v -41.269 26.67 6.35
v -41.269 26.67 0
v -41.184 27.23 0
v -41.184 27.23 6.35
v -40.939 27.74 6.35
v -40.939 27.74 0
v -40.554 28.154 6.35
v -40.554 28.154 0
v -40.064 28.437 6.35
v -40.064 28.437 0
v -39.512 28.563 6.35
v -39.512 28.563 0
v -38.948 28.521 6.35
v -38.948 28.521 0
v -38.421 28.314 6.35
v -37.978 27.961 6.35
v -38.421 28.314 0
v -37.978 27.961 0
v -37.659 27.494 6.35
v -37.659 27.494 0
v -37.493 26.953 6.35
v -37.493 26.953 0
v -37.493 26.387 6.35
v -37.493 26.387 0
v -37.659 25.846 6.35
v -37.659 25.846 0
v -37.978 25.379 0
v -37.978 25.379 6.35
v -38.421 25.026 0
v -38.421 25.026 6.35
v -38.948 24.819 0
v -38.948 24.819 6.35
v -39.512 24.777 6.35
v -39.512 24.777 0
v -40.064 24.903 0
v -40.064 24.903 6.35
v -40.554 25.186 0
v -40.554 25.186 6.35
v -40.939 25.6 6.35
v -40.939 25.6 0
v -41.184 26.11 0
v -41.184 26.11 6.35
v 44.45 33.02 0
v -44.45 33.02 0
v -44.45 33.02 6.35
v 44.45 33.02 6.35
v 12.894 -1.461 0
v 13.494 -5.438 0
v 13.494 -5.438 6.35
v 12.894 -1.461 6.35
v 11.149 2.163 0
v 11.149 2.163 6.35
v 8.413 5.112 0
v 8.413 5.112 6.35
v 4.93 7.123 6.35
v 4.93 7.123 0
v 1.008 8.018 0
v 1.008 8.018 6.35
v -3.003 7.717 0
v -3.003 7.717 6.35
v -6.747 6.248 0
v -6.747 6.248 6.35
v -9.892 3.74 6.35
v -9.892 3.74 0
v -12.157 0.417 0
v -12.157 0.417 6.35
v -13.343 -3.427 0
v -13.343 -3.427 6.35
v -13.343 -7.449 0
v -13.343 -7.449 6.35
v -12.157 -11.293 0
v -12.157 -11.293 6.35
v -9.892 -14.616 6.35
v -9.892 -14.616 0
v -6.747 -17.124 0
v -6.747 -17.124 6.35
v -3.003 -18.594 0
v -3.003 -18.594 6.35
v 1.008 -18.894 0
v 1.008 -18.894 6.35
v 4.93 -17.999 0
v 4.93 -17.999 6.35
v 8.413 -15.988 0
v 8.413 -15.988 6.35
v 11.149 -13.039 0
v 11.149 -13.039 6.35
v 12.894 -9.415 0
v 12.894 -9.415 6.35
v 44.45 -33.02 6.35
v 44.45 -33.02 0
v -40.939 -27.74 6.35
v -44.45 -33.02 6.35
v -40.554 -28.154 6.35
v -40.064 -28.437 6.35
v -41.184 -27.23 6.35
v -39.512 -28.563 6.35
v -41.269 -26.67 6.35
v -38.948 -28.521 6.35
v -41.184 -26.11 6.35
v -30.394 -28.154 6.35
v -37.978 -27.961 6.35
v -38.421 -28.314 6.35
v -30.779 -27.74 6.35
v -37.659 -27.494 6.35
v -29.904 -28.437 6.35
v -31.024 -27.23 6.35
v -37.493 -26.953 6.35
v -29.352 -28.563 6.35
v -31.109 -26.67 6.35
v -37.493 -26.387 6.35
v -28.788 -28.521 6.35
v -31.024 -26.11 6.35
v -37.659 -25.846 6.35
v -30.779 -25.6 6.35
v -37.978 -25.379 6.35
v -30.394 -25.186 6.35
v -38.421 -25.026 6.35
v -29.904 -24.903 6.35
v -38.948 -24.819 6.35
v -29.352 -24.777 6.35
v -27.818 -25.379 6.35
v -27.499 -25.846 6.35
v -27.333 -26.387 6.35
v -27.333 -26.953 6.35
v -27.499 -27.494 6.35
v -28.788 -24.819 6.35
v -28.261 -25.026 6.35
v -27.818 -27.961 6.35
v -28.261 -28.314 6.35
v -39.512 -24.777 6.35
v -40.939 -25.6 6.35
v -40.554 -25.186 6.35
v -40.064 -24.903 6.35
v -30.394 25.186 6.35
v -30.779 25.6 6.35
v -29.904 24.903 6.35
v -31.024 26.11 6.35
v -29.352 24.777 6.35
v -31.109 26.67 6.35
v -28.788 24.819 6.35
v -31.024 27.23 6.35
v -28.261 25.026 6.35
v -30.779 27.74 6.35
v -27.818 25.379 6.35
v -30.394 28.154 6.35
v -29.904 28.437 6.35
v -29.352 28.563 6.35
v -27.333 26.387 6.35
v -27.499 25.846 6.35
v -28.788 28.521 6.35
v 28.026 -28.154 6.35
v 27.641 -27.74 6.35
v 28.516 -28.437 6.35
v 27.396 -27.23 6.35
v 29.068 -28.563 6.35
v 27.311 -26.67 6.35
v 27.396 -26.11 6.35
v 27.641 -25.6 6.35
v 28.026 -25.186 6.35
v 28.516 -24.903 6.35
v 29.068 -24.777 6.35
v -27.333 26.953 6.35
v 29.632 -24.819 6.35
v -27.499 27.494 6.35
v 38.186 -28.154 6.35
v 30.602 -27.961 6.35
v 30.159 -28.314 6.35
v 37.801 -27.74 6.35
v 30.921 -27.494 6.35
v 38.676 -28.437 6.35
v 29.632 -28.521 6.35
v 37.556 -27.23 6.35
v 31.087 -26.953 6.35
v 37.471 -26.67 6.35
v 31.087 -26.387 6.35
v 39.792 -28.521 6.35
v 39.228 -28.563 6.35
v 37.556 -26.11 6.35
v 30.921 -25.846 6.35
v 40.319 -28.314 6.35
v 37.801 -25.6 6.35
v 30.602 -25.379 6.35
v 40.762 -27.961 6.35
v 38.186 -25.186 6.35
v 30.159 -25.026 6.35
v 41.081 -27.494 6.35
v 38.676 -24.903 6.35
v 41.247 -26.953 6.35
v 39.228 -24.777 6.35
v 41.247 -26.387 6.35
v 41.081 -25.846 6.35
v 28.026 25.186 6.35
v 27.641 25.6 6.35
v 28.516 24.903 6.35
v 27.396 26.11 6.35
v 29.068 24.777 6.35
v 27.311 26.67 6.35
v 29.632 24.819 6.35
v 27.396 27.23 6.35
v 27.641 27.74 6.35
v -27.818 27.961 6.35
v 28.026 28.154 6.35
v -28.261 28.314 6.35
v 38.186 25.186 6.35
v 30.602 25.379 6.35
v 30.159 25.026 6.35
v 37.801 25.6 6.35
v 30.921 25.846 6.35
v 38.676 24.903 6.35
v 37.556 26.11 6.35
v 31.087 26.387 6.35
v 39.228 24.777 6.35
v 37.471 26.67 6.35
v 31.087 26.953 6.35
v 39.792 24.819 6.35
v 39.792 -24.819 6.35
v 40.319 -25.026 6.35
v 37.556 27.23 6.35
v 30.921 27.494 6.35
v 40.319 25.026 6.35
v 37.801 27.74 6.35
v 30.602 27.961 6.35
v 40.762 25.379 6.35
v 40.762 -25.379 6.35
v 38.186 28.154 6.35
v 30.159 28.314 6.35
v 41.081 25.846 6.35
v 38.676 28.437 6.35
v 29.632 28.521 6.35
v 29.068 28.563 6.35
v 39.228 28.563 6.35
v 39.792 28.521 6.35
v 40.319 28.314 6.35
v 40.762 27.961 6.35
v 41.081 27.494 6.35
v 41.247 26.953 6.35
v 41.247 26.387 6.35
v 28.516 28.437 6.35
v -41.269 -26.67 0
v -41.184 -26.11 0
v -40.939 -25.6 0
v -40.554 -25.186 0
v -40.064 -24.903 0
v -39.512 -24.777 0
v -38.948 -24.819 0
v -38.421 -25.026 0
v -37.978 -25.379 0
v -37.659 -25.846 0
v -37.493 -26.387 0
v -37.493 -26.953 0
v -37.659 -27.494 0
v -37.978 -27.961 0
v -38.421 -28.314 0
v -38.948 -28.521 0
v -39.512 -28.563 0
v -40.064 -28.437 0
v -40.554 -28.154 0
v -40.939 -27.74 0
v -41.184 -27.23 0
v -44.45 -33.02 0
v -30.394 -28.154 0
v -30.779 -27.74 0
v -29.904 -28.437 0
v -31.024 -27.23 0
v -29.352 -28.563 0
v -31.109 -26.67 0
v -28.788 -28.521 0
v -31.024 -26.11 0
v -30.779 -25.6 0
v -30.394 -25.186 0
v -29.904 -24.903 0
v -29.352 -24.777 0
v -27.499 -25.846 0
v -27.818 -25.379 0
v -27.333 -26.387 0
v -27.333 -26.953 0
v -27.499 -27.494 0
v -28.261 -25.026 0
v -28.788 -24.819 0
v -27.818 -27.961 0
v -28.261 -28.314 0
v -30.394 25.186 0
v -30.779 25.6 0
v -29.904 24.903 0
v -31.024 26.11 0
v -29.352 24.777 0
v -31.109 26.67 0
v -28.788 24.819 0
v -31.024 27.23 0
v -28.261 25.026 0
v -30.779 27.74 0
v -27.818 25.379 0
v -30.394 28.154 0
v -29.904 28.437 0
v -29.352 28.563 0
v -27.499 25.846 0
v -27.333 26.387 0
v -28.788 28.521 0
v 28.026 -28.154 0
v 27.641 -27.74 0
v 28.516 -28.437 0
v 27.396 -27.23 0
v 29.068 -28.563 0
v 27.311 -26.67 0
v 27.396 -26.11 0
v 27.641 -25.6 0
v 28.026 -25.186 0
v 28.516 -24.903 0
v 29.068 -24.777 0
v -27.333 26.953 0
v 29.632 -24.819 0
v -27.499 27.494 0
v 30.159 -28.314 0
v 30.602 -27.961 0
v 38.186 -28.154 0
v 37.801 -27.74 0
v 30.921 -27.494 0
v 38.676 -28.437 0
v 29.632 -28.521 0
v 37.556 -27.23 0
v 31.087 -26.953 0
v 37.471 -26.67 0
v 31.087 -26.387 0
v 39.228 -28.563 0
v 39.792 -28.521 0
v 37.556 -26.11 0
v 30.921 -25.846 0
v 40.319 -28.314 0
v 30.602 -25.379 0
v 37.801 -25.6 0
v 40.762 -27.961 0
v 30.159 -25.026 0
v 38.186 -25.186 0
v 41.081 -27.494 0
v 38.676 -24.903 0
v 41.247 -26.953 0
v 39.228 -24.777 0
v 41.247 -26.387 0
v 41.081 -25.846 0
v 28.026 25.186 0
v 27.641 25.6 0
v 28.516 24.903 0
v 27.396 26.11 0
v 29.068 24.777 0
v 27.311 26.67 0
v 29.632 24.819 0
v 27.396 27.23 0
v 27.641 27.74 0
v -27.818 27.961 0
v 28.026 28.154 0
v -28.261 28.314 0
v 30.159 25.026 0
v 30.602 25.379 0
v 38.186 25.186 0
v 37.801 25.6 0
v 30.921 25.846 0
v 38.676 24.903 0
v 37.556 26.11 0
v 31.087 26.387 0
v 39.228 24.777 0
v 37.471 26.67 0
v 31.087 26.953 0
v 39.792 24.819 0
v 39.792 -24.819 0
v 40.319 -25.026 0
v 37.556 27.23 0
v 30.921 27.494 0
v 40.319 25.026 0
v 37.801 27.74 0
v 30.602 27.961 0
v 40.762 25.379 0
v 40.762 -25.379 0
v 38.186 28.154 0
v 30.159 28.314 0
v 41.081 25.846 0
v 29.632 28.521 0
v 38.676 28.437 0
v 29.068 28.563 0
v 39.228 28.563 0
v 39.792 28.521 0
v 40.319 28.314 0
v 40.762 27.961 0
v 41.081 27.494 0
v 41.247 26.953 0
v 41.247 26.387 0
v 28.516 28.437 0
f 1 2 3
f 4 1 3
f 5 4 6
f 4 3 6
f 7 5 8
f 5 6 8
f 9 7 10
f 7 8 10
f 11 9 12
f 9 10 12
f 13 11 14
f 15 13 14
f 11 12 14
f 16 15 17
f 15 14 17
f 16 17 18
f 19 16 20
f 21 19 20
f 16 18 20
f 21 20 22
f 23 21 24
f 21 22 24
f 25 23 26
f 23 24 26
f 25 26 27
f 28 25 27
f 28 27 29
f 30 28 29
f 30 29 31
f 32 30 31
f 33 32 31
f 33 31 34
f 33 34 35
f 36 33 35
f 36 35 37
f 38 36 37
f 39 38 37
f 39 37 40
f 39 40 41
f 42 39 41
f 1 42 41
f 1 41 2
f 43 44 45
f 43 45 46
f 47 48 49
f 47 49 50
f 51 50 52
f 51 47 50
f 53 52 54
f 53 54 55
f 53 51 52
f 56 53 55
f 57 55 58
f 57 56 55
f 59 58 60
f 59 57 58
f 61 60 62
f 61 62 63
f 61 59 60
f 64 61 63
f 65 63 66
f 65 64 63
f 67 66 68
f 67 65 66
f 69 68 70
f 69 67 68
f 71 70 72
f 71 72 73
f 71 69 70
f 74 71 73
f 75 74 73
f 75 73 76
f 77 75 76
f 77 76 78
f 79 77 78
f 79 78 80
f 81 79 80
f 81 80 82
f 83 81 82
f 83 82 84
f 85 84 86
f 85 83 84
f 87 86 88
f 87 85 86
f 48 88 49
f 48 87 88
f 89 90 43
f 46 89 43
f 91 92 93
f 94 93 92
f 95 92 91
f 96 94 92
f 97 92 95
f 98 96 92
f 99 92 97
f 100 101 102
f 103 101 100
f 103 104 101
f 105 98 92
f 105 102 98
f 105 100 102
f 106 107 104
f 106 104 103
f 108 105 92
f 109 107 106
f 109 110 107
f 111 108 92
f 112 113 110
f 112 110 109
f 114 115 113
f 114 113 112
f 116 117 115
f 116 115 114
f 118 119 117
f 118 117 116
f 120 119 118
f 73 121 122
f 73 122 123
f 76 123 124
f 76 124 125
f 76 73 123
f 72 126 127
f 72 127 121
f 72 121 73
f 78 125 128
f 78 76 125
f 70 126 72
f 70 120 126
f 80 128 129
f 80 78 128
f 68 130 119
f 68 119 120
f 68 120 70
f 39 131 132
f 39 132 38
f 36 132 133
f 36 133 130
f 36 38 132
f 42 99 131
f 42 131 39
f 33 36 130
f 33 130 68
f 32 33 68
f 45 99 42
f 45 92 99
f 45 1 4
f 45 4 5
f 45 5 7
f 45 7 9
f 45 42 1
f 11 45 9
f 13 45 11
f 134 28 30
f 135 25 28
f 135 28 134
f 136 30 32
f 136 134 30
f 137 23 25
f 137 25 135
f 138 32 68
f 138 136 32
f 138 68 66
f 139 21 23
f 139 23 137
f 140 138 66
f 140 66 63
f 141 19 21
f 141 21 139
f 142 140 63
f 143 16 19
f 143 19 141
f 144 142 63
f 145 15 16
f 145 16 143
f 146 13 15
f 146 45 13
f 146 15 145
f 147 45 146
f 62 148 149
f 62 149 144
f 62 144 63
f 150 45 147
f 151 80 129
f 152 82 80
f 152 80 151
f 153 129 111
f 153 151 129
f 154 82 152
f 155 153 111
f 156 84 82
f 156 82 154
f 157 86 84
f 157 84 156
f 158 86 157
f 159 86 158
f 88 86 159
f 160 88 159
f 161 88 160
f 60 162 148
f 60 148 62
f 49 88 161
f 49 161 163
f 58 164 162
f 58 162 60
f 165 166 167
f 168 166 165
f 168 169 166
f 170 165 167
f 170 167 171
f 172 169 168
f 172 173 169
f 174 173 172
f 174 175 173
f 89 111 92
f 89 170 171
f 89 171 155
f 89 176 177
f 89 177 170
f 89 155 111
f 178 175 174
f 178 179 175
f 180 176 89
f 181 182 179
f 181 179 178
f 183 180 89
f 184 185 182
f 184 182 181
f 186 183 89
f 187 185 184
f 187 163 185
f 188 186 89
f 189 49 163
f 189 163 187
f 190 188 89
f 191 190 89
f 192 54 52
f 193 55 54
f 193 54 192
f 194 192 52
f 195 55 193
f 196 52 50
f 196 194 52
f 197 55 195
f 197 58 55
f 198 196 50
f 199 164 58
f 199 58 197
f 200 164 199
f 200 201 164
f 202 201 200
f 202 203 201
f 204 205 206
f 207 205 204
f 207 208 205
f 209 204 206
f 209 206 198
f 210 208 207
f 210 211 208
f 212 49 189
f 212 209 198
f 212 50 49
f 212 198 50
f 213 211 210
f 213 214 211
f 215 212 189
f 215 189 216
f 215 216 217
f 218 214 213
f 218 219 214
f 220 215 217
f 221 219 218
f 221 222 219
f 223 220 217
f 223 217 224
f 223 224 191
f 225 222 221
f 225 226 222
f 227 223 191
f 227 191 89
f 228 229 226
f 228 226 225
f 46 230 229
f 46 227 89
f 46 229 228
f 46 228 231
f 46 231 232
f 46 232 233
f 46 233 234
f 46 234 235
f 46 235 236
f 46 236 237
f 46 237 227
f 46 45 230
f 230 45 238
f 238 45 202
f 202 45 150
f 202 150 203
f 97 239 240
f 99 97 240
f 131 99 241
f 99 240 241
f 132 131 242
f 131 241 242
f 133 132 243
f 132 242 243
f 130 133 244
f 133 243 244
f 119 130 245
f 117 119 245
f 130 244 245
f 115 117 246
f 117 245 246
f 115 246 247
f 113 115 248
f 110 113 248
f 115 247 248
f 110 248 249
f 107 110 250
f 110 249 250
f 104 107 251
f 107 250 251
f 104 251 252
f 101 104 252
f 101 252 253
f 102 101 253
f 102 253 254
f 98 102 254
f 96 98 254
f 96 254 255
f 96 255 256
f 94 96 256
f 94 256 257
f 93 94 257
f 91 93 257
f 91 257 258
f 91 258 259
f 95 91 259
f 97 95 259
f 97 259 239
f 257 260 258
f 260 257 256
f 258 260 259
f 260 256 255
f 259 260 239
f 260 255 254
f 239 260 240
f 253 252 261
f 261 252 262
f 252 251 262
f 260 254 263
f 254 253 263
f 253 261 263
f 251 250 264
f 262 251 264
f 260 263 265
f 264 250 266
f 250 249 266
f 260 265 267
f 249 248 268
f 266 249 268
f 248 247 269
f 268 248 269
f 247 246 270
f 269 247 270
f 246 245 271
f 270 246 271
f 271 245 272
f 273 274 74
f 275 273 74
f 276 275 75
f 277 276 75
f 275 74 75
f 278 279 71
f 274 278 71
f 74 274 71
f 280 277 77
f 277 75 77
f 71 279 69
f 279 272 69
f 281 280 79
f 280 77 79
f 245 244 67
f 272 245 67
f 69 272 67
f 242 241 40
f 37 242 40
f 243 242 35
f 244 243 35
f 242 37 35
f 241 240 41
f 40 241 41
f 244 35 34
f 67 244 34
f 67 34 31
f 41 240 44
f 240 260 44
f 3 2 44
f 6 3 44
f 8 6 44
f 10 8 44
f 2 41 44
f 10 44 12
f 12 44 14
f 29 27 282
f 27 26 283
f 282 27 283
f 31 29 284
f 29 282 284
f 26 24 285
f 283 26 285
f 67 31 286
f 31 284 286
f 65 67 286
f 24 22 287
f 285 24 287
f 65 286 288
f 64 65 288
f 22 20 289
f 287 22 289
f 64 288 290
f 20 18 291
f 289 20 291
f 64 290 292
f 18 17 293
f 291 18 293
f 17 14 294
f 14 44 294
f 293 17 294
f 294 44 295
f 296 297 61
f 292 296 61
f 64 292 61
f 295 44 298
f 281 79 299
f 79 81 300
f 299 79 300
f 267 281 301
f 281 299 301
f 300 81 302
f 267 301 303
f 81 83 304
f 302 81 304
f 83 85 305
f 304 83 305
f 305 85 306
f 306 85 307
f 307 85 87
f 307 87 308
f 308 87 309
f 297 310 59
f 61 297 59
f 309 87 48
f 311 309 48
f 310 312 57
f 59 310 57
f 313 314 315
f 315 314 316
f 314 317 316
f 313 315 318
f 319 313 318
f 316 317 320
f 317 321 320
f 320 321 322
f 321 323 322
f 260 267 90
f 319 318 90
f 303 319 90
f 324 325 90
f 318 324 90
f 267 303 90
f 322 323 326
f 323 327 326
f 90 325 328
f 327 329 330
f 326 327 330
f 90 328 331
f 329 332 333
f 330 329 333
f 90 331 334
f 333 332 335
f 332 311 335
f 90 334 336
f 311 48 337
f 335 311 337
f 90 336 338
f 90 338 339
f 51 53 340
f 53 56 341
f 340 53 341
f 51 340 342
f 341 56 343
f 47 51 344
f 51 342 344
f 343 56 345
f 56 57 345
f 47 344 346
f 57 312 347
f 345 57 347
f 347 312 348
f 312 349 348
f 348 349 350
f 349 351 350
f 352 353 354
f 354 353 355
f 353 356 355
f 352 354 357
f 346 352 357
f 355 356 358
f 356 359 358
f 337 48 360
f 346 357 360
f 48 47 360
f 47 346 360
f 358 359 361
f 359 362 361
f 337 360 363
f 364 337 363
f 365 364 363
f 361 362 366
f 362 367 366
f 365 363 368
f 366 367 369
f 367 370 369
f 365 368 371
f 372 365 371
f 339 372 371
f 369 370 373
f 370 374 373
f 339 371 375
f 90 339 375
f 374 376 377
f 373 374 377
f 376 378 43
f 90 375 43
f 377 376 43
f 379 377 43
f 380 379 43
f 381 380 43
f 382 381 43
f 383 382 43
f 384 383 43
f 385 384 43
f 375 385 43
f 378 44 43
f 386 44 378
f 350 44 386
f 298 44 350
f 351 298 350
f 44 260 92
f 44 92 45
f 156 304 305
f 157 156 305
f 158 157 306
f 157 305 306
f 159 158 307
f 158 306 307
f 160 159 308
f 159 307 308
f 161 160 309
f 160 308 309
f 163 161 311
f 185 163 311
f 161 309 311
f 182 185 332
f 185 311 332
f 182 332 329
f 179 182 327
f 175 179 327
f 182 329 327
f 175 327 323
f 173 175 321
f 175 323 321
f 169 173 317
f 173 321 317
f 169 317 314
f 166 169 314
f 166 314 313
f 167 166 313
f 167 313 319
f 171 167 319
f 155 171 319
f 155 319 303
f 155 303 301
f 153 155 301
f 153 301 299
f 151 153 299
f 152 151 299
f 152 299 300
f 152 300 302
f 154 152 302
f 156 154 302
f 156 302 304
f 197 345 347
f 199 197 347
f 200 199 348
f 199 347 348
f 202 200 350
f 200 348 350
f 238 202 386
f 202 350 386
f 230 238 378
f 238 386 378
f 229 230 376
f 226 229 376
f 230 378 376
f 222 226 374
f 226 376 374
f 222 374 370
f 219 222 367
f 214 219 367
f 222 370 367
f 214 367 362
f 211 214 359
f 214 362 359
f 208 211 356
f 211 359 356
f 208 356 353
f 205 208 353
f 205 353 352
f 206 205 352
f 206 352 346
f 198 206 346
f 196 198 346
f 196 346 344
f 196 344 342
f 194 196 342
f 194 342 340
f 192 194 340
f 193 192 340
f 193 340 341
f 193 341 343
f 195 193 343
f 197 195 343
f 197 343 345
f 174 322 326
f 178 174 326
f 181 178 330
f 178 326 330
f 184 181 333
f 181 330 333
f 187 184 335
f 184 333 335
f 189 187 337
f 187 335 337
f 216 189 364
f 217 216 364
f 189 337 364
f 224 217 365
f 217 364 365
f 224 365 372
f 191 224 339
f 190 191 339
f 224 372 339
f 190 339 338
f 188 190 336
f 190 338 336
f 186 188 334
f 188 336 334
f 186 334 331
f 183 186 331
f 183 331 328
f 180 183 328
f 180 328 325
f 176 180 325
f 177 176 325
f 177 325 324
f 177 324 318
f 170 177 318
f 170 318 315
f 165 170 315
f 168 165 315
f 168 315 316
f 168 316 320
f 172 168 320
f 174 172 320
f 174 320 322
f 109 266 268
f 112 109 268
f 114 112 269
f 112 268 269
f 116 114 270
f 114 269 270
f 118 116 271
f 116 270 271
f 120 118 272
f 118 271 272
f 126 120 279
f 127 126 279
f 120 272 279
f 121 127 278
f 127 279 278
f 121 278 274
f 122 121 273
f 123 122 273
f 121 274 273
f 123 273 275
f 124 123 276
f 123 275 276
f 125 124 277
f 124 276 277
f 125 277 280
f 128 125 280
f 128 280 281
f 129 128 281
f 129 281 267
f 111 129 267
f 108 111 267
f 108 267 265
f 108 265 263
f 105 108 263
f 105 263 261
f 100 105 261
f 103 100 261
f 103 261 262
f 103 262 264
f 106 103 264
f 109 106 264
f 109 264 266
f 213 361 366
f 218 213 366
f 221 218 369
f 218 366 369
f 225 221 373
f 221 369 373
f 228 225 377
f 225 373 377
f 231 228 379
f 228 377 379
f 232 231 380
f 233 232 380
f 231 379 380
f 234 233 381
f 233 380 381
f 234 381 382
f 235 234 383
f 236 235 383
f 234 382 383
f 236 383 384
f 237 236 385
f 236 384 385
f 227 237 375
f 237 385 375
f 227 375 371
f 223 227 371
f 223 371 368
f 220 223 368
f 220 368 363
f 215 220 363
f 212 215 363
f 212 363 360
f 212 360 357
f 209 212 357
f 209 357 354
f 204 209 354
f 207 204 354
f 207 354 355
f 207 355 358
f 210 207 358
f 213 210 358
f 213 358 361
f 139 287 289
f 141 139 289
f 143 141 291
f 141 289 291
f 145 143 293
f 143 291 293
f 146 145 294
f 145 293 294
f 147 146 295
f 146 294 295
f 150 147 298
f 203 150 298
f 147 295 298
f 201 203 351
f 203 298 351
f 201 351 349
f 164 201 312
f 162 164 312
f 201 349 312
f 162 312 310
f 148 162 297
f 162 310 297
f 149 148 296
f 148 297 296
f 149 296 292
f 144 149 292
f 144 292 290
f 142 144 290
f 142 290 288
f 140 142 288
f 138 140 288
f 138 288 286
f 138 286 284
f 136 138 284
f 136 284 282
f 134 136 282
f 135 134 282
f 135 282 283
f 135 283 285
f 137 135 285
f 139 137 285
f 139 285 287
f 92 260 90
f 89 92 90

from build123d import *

# Parameters (mm, degrees)
SKETCH1_W             = 88.9
SKETCH1_H             = 66.04
SKETCH1_R             = 13.49375
BOSS_EXTRUDE1_DEPTH   = 6.35
F_6_CLEARANCE_HOLE1_D = 3.7973
F_6_CLEARANCE_HOLE2_D = 3.7973


with BuildPart() as part:
    # Sketch1 → Boss-Extrude1 (new body)
    with BuildSketch(Plane.XY):
        Rectangle(SKETCH1_W, SKETCH1_H)
        with Locations((0, -5.43814)):
            Circle(SKETCH1_R, mode=Mode.SUBTRACT)
    extrude(amount=BOSS_EXTRUDE1_DEPTH)

    # #6 Clearance Hole1 (through all)
    with Locations(Plane.XY.offset(6.35)):
        with Locations((-39.37, -26.67), (-29.21, -26.67), (29.21, -26.67), (39.37, -26.67)):
            Hole(F_6_CLEARANCE_HOLE1_D / 2)

    # #6 Clearance Hole2 (through all)
    with Locations(Plane(origin=(-39.37, 26.67, 6.35), x_dir=(1, 0, 0), z_dir=(0, 0, 1))):
        with Locations((0, 0), (10.16, 0), (68.58, 0), (78.74, 0)):
            Hole(F_6_CLEARANCE_HOLE2_D / 2)


solid = part.part
